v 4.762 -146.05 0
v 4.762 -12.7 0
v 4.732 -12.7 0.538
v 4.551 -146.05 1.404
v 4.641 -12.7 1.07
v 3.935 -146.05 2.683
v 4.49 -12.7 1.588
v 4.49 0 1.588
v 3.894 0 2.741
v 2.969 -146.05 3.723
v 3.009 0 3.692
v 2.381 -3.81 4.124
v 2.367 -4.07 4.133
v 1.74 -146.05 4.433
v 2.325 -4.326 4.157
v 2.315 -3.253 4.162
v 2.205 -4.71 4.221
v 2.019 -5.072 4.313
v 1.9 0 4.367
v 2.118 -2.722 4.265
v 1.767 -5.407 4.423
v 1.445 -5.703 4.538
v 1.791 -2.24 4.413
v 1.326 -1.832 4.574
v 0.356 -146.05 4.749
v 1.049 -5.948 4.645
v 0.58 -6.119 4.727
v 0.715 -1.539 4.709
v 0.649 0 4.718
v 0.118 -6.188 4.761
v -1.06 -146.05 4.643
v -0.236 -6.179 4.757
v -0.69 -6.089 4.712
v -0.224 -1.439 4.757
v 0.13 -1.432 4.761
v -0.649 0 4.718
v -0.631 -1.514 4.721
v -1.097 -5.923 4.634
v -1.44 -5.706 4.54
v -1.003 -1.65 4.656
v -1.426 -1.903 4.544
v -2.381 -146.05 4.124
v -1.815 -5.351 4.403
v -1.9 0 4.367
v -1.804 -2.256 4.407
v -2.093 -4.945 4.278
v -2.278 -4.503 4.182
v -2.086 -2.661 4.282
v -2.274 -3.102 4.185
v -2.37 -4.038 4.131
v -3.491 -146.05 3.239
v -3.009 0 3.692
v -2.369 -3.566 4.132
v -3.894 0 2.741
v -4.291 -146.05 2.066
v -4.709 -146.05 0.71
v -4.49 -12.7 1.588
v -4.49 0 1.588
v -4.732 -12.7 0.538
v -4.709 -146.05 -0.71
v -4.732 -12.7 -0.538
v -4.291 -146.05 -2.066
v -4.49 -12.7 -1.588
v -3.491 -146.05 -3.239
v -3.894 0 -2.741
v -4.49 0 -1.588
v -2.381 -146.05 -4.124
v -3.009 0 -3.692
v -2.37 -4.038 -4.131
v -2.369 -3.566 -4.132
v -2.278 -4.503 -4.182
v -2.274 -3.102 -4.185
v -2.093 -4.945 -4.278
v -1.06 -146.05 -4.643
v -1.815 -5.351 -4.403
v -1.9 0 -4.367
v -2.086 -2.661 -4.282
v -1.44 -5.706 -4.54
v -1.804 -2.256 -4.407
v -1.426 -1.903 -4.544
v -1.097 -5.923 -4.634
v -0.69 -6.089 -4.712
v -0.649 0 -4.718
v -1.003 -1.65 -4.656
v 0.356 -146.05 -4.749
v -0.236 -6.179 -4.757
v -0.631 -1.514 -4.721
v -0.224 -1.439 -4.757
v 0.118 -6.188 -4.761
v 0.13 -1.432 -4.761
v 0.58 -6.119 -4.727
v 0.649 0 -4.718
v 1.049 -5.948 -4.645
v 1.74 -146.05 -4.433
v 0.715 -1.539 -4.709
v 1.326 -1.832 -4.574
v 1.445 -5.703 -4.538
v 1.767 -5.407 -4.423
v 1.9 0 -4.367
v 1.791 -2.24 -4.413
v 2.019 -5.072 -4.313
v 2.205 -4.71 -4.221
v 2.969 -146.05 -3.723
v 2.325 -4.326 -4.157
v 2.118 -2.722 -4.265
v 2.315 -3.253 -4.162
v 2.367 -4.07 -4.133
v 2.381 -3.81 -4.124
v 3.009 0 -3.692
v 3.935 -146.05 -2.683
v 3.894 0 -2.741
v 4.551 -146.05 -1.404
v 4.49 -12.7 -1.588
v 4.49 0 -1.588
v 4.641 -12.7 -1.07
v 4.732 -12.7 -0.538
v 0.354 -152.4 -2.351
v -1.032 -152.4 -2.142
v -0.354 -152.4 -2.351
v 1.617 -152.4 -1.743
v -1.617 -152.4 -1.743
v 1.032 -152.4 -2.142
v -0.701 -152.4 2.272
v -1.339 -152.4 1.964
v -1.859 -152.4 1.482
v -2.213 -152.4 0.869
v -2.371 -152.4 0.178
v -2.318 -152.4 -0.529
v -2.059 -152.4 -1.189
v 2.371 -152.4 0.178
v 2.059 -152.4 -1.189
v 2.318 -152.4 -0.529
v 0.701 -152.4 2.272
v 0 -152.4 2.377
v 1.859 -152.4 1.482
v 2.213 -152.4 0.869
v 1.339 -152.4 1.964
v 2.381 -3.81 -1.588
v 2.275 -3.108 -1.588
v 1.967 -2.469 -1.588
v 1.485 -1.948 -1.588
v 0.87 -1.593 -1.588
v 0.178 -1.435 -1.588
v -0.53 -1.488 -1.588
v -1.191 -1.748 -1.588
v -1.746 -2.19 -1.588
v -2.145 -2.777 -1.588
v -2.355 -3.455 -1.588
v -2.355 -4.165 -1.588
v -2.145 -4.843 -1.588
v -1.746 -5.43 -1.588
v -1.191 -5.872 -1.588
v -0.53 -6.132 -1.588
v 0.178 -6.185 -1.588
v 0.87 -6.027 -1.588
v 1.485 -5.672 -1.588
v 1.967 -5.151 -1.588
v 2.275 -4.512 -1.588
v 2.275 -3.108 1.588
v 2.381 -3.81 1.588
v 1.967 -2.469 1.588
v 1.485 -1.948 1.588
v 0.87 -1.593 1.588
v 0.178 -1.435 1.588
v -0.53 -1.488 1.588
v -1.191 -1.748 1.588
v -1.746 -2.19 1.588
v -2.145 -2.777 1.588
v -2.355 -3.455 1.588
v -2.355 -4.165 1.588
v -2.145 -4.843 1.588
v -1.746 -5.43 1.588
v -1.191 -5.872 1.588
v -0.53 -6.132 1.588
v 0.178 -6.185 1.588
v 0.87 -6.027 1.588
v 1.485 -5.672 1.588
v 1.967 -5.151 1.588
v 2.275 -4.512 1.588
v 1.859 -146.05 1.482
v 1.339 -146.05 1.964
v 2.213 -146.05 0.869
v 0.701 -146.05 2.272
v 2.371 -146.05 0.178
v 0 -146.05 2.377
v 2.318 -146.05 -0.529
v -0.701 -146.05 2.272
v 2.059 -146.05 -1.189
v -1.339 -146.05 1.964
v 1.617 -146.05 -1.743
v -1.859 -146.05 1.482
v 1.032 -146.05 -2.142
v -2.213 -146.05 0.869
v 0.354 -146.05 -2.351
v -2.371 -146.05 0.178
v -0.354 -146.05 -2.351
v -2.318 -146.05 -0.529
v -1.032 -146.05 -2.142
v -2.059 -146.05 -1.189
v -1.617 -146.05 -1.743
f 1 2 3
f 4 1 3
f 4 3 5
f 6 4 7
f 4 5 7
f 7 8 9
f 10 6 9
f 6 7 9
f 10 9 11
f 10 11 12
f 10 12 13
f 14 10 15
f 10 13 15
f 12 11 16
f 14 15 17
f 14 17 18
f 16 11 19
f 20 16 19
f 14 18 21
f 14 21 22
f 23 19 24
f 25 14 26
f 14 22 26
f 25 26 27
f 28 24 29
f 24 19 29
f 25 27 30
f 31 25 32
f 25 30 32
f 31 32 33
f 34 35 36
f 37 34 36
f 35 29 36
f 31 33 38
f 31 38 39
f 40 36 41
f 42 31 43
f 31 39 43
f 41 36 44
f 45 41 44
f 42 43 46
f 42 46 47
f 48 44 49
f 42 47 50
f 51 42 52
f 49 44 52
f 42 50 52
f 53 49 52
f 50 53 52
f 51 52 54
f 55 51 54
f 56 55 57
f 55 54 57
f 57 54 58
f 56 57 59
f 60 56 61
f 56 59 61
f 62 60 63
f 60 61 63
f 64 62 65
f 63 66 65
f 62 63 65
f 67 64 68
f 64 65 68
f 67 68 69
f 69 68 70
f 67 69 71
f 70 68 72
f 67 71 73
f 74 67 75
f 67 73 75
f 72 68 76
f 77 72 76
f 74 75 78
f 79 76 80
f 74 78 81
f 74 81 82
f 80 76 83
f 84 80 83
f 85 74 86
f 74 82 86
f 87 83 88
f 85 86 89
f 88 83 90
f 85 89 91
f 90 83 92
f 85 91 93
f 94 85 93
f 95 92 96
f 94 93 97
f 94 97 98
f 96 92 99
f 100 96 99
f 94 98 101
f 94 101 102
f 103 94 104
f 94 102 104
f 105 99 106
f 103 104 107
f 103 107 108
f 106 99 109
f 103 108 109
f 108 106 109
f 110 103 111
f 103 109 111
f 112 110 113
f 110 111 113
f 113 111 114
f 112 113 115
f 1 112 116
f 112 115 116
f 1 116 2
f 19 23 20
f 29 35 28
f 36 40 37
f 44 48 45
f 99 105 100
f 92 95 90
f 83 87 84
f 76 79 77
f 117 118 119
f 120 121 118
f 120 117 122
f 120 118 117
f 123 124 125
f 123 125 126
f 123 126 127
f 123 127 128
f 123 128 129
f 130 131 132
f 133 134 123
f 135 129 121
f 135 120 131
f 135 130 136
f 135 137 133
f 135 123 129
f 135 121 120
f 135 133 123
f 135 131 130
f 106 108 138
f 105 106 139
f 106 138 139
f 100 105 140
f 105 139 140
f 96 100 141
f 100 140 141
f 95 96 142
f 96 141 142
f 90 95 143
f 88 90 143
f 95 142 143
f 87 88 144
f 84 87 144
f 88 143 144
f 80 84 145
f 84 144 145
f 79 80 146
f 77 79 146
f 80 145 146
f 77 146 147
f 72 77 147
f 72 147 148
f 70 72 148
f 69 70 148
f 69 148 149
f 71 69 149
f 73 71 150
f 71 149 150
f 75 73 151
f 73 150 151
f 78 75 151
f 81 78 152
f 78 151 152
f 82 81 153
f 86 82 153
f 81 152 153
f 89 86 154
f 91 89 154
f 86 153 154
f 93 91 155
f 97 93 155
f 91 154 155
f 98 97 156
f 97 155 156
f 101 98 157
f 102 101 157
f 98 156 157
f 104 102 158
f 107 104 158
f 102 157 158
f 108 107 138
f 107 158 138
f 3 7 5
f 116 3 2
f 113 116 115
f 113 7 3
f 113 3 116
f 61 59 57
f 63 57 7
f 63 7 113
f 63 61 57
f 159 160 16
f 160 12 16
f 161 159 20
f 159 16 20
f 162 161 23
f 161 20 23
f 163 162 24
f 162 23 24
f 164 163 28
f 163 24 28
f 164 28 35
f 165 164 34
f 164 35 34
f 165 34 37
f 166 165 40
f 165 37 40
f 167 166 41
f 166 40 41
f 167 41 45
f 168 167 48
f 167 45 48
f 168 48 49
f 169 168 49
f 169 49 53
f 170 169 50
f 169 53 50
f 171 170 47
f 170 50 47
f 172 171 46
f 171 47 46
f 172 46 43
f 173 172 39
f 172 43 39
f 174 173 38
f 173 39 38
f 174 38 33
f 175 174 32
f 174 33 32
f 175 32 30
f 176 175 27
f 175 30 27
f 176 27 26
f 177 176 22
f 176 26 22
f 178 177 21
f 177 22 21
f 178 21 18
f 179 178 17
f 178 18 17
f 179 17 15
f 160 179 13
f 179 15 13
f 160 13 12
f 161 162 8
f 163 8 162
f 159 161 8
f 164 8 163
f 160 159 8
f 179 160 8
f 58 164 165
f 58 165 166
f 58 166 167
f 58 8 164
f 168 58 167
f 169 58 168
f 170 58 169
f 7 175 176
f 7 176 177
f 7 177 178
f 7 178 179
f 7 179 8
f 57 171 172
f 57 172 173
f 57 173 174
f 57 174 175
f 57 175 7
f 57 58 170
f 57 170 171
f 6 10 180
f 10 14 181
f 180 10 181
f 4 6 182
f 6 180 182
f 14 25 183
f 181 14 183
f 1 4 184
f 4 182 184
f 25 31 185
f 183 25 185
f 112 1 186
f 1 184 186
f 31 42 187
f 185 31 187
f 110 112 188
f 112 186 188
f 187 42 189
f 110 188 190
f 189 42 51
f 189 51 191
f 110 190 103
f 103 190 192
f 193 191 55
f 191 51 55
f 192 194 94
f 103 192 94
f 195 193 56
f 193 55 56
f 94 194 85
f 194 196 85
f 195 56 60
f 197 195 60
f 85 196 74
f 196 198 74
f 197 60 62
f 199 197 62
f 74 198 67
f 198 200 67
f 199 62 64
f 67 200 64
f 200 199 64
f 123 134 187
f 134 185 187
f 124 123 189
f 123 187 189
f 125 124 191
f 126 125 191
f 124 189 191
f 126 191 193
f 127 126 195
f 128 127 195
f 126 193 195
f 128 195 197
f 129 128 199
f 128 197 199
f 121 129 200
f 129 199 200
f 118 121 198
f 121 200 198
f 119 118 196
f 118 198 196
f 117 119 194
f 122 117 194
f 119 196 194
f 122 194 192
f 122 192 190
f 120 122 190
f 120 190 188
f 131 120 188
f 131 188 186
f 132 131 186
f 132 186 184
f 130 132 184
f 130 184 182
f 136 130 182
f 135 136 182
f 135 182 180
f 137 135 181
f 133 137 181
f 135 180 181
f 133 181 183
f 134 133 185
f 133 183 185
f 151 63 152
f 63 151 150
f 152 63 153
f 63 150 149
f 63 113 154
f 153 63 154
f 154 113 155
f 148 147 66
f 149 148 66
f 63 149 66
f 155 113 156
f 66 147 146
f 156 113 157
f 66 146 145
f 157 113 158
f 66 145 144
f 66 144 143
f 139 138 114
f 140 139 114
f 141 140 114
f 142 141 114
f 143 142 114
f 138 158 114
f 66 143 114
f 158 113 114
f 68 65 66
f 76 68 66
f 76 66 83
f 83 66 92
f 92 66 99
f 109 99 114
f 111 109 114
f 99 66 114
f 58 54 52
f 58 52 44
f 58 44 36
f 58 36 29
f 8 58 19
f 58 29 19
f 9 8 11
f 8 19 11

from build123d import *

# Parameters (mm, degrees)
F0_R          = 4.7625
F1_DEPTH      = 152.4
F2_W          = 6.35
F2_H          = 4.7452268491
F5_DEPTH      = 4.7635
F5_DEPTH_BACK = 4.7635
F6_R          = 2.38125
F7_DEPTH      = 12.7


with BuildPart() as f1:
    # F0 (on Front) → F1 (new body)
    with BuildSketch(Plane.XZ):
        Circle(F0_R)
    extrude(amount=F1_DEPTH)

    # F2 (on Right) → F3 (revolve, cut)
    with BuildSketch(Plane.YZ):
        with Locations((-149.225, 4.7500534246)):
            Rectangle(F2_W, F2_H)
    revolve(axis=Axis((0, -25.3480933607, 0), (0, -1, 0)), mode=Mode.SUBTRACT)

    # F4 (on Right) → F5 (cut, two sides)
    with BuildSketch(Plane.YZ) as f5_sk:
        Polygon((0, -1.5875), (0, 0), (0, 1.5875), (-12.7, 1.5875), (-12.7, 0), (-12.7, -1.5875), align=None)
    extrude(amount=-F5_DEPTH, mode=Mode.SUBTRACT)
    extrude(f5_sk.sketch, amount=F5_DEPTH_BACK, mode=Mode.SUBTRACT)

    # F6 (on Top) → F7 (cut, symmetric)
    with BuildSketch(Plane.XY):
        with Locations((0, -3.81)):
            Circle(F6_R)
    extrude(amount=F7_DEPTH, both=True, mode=Mode.SUBTRACT)


solid = f1.part
